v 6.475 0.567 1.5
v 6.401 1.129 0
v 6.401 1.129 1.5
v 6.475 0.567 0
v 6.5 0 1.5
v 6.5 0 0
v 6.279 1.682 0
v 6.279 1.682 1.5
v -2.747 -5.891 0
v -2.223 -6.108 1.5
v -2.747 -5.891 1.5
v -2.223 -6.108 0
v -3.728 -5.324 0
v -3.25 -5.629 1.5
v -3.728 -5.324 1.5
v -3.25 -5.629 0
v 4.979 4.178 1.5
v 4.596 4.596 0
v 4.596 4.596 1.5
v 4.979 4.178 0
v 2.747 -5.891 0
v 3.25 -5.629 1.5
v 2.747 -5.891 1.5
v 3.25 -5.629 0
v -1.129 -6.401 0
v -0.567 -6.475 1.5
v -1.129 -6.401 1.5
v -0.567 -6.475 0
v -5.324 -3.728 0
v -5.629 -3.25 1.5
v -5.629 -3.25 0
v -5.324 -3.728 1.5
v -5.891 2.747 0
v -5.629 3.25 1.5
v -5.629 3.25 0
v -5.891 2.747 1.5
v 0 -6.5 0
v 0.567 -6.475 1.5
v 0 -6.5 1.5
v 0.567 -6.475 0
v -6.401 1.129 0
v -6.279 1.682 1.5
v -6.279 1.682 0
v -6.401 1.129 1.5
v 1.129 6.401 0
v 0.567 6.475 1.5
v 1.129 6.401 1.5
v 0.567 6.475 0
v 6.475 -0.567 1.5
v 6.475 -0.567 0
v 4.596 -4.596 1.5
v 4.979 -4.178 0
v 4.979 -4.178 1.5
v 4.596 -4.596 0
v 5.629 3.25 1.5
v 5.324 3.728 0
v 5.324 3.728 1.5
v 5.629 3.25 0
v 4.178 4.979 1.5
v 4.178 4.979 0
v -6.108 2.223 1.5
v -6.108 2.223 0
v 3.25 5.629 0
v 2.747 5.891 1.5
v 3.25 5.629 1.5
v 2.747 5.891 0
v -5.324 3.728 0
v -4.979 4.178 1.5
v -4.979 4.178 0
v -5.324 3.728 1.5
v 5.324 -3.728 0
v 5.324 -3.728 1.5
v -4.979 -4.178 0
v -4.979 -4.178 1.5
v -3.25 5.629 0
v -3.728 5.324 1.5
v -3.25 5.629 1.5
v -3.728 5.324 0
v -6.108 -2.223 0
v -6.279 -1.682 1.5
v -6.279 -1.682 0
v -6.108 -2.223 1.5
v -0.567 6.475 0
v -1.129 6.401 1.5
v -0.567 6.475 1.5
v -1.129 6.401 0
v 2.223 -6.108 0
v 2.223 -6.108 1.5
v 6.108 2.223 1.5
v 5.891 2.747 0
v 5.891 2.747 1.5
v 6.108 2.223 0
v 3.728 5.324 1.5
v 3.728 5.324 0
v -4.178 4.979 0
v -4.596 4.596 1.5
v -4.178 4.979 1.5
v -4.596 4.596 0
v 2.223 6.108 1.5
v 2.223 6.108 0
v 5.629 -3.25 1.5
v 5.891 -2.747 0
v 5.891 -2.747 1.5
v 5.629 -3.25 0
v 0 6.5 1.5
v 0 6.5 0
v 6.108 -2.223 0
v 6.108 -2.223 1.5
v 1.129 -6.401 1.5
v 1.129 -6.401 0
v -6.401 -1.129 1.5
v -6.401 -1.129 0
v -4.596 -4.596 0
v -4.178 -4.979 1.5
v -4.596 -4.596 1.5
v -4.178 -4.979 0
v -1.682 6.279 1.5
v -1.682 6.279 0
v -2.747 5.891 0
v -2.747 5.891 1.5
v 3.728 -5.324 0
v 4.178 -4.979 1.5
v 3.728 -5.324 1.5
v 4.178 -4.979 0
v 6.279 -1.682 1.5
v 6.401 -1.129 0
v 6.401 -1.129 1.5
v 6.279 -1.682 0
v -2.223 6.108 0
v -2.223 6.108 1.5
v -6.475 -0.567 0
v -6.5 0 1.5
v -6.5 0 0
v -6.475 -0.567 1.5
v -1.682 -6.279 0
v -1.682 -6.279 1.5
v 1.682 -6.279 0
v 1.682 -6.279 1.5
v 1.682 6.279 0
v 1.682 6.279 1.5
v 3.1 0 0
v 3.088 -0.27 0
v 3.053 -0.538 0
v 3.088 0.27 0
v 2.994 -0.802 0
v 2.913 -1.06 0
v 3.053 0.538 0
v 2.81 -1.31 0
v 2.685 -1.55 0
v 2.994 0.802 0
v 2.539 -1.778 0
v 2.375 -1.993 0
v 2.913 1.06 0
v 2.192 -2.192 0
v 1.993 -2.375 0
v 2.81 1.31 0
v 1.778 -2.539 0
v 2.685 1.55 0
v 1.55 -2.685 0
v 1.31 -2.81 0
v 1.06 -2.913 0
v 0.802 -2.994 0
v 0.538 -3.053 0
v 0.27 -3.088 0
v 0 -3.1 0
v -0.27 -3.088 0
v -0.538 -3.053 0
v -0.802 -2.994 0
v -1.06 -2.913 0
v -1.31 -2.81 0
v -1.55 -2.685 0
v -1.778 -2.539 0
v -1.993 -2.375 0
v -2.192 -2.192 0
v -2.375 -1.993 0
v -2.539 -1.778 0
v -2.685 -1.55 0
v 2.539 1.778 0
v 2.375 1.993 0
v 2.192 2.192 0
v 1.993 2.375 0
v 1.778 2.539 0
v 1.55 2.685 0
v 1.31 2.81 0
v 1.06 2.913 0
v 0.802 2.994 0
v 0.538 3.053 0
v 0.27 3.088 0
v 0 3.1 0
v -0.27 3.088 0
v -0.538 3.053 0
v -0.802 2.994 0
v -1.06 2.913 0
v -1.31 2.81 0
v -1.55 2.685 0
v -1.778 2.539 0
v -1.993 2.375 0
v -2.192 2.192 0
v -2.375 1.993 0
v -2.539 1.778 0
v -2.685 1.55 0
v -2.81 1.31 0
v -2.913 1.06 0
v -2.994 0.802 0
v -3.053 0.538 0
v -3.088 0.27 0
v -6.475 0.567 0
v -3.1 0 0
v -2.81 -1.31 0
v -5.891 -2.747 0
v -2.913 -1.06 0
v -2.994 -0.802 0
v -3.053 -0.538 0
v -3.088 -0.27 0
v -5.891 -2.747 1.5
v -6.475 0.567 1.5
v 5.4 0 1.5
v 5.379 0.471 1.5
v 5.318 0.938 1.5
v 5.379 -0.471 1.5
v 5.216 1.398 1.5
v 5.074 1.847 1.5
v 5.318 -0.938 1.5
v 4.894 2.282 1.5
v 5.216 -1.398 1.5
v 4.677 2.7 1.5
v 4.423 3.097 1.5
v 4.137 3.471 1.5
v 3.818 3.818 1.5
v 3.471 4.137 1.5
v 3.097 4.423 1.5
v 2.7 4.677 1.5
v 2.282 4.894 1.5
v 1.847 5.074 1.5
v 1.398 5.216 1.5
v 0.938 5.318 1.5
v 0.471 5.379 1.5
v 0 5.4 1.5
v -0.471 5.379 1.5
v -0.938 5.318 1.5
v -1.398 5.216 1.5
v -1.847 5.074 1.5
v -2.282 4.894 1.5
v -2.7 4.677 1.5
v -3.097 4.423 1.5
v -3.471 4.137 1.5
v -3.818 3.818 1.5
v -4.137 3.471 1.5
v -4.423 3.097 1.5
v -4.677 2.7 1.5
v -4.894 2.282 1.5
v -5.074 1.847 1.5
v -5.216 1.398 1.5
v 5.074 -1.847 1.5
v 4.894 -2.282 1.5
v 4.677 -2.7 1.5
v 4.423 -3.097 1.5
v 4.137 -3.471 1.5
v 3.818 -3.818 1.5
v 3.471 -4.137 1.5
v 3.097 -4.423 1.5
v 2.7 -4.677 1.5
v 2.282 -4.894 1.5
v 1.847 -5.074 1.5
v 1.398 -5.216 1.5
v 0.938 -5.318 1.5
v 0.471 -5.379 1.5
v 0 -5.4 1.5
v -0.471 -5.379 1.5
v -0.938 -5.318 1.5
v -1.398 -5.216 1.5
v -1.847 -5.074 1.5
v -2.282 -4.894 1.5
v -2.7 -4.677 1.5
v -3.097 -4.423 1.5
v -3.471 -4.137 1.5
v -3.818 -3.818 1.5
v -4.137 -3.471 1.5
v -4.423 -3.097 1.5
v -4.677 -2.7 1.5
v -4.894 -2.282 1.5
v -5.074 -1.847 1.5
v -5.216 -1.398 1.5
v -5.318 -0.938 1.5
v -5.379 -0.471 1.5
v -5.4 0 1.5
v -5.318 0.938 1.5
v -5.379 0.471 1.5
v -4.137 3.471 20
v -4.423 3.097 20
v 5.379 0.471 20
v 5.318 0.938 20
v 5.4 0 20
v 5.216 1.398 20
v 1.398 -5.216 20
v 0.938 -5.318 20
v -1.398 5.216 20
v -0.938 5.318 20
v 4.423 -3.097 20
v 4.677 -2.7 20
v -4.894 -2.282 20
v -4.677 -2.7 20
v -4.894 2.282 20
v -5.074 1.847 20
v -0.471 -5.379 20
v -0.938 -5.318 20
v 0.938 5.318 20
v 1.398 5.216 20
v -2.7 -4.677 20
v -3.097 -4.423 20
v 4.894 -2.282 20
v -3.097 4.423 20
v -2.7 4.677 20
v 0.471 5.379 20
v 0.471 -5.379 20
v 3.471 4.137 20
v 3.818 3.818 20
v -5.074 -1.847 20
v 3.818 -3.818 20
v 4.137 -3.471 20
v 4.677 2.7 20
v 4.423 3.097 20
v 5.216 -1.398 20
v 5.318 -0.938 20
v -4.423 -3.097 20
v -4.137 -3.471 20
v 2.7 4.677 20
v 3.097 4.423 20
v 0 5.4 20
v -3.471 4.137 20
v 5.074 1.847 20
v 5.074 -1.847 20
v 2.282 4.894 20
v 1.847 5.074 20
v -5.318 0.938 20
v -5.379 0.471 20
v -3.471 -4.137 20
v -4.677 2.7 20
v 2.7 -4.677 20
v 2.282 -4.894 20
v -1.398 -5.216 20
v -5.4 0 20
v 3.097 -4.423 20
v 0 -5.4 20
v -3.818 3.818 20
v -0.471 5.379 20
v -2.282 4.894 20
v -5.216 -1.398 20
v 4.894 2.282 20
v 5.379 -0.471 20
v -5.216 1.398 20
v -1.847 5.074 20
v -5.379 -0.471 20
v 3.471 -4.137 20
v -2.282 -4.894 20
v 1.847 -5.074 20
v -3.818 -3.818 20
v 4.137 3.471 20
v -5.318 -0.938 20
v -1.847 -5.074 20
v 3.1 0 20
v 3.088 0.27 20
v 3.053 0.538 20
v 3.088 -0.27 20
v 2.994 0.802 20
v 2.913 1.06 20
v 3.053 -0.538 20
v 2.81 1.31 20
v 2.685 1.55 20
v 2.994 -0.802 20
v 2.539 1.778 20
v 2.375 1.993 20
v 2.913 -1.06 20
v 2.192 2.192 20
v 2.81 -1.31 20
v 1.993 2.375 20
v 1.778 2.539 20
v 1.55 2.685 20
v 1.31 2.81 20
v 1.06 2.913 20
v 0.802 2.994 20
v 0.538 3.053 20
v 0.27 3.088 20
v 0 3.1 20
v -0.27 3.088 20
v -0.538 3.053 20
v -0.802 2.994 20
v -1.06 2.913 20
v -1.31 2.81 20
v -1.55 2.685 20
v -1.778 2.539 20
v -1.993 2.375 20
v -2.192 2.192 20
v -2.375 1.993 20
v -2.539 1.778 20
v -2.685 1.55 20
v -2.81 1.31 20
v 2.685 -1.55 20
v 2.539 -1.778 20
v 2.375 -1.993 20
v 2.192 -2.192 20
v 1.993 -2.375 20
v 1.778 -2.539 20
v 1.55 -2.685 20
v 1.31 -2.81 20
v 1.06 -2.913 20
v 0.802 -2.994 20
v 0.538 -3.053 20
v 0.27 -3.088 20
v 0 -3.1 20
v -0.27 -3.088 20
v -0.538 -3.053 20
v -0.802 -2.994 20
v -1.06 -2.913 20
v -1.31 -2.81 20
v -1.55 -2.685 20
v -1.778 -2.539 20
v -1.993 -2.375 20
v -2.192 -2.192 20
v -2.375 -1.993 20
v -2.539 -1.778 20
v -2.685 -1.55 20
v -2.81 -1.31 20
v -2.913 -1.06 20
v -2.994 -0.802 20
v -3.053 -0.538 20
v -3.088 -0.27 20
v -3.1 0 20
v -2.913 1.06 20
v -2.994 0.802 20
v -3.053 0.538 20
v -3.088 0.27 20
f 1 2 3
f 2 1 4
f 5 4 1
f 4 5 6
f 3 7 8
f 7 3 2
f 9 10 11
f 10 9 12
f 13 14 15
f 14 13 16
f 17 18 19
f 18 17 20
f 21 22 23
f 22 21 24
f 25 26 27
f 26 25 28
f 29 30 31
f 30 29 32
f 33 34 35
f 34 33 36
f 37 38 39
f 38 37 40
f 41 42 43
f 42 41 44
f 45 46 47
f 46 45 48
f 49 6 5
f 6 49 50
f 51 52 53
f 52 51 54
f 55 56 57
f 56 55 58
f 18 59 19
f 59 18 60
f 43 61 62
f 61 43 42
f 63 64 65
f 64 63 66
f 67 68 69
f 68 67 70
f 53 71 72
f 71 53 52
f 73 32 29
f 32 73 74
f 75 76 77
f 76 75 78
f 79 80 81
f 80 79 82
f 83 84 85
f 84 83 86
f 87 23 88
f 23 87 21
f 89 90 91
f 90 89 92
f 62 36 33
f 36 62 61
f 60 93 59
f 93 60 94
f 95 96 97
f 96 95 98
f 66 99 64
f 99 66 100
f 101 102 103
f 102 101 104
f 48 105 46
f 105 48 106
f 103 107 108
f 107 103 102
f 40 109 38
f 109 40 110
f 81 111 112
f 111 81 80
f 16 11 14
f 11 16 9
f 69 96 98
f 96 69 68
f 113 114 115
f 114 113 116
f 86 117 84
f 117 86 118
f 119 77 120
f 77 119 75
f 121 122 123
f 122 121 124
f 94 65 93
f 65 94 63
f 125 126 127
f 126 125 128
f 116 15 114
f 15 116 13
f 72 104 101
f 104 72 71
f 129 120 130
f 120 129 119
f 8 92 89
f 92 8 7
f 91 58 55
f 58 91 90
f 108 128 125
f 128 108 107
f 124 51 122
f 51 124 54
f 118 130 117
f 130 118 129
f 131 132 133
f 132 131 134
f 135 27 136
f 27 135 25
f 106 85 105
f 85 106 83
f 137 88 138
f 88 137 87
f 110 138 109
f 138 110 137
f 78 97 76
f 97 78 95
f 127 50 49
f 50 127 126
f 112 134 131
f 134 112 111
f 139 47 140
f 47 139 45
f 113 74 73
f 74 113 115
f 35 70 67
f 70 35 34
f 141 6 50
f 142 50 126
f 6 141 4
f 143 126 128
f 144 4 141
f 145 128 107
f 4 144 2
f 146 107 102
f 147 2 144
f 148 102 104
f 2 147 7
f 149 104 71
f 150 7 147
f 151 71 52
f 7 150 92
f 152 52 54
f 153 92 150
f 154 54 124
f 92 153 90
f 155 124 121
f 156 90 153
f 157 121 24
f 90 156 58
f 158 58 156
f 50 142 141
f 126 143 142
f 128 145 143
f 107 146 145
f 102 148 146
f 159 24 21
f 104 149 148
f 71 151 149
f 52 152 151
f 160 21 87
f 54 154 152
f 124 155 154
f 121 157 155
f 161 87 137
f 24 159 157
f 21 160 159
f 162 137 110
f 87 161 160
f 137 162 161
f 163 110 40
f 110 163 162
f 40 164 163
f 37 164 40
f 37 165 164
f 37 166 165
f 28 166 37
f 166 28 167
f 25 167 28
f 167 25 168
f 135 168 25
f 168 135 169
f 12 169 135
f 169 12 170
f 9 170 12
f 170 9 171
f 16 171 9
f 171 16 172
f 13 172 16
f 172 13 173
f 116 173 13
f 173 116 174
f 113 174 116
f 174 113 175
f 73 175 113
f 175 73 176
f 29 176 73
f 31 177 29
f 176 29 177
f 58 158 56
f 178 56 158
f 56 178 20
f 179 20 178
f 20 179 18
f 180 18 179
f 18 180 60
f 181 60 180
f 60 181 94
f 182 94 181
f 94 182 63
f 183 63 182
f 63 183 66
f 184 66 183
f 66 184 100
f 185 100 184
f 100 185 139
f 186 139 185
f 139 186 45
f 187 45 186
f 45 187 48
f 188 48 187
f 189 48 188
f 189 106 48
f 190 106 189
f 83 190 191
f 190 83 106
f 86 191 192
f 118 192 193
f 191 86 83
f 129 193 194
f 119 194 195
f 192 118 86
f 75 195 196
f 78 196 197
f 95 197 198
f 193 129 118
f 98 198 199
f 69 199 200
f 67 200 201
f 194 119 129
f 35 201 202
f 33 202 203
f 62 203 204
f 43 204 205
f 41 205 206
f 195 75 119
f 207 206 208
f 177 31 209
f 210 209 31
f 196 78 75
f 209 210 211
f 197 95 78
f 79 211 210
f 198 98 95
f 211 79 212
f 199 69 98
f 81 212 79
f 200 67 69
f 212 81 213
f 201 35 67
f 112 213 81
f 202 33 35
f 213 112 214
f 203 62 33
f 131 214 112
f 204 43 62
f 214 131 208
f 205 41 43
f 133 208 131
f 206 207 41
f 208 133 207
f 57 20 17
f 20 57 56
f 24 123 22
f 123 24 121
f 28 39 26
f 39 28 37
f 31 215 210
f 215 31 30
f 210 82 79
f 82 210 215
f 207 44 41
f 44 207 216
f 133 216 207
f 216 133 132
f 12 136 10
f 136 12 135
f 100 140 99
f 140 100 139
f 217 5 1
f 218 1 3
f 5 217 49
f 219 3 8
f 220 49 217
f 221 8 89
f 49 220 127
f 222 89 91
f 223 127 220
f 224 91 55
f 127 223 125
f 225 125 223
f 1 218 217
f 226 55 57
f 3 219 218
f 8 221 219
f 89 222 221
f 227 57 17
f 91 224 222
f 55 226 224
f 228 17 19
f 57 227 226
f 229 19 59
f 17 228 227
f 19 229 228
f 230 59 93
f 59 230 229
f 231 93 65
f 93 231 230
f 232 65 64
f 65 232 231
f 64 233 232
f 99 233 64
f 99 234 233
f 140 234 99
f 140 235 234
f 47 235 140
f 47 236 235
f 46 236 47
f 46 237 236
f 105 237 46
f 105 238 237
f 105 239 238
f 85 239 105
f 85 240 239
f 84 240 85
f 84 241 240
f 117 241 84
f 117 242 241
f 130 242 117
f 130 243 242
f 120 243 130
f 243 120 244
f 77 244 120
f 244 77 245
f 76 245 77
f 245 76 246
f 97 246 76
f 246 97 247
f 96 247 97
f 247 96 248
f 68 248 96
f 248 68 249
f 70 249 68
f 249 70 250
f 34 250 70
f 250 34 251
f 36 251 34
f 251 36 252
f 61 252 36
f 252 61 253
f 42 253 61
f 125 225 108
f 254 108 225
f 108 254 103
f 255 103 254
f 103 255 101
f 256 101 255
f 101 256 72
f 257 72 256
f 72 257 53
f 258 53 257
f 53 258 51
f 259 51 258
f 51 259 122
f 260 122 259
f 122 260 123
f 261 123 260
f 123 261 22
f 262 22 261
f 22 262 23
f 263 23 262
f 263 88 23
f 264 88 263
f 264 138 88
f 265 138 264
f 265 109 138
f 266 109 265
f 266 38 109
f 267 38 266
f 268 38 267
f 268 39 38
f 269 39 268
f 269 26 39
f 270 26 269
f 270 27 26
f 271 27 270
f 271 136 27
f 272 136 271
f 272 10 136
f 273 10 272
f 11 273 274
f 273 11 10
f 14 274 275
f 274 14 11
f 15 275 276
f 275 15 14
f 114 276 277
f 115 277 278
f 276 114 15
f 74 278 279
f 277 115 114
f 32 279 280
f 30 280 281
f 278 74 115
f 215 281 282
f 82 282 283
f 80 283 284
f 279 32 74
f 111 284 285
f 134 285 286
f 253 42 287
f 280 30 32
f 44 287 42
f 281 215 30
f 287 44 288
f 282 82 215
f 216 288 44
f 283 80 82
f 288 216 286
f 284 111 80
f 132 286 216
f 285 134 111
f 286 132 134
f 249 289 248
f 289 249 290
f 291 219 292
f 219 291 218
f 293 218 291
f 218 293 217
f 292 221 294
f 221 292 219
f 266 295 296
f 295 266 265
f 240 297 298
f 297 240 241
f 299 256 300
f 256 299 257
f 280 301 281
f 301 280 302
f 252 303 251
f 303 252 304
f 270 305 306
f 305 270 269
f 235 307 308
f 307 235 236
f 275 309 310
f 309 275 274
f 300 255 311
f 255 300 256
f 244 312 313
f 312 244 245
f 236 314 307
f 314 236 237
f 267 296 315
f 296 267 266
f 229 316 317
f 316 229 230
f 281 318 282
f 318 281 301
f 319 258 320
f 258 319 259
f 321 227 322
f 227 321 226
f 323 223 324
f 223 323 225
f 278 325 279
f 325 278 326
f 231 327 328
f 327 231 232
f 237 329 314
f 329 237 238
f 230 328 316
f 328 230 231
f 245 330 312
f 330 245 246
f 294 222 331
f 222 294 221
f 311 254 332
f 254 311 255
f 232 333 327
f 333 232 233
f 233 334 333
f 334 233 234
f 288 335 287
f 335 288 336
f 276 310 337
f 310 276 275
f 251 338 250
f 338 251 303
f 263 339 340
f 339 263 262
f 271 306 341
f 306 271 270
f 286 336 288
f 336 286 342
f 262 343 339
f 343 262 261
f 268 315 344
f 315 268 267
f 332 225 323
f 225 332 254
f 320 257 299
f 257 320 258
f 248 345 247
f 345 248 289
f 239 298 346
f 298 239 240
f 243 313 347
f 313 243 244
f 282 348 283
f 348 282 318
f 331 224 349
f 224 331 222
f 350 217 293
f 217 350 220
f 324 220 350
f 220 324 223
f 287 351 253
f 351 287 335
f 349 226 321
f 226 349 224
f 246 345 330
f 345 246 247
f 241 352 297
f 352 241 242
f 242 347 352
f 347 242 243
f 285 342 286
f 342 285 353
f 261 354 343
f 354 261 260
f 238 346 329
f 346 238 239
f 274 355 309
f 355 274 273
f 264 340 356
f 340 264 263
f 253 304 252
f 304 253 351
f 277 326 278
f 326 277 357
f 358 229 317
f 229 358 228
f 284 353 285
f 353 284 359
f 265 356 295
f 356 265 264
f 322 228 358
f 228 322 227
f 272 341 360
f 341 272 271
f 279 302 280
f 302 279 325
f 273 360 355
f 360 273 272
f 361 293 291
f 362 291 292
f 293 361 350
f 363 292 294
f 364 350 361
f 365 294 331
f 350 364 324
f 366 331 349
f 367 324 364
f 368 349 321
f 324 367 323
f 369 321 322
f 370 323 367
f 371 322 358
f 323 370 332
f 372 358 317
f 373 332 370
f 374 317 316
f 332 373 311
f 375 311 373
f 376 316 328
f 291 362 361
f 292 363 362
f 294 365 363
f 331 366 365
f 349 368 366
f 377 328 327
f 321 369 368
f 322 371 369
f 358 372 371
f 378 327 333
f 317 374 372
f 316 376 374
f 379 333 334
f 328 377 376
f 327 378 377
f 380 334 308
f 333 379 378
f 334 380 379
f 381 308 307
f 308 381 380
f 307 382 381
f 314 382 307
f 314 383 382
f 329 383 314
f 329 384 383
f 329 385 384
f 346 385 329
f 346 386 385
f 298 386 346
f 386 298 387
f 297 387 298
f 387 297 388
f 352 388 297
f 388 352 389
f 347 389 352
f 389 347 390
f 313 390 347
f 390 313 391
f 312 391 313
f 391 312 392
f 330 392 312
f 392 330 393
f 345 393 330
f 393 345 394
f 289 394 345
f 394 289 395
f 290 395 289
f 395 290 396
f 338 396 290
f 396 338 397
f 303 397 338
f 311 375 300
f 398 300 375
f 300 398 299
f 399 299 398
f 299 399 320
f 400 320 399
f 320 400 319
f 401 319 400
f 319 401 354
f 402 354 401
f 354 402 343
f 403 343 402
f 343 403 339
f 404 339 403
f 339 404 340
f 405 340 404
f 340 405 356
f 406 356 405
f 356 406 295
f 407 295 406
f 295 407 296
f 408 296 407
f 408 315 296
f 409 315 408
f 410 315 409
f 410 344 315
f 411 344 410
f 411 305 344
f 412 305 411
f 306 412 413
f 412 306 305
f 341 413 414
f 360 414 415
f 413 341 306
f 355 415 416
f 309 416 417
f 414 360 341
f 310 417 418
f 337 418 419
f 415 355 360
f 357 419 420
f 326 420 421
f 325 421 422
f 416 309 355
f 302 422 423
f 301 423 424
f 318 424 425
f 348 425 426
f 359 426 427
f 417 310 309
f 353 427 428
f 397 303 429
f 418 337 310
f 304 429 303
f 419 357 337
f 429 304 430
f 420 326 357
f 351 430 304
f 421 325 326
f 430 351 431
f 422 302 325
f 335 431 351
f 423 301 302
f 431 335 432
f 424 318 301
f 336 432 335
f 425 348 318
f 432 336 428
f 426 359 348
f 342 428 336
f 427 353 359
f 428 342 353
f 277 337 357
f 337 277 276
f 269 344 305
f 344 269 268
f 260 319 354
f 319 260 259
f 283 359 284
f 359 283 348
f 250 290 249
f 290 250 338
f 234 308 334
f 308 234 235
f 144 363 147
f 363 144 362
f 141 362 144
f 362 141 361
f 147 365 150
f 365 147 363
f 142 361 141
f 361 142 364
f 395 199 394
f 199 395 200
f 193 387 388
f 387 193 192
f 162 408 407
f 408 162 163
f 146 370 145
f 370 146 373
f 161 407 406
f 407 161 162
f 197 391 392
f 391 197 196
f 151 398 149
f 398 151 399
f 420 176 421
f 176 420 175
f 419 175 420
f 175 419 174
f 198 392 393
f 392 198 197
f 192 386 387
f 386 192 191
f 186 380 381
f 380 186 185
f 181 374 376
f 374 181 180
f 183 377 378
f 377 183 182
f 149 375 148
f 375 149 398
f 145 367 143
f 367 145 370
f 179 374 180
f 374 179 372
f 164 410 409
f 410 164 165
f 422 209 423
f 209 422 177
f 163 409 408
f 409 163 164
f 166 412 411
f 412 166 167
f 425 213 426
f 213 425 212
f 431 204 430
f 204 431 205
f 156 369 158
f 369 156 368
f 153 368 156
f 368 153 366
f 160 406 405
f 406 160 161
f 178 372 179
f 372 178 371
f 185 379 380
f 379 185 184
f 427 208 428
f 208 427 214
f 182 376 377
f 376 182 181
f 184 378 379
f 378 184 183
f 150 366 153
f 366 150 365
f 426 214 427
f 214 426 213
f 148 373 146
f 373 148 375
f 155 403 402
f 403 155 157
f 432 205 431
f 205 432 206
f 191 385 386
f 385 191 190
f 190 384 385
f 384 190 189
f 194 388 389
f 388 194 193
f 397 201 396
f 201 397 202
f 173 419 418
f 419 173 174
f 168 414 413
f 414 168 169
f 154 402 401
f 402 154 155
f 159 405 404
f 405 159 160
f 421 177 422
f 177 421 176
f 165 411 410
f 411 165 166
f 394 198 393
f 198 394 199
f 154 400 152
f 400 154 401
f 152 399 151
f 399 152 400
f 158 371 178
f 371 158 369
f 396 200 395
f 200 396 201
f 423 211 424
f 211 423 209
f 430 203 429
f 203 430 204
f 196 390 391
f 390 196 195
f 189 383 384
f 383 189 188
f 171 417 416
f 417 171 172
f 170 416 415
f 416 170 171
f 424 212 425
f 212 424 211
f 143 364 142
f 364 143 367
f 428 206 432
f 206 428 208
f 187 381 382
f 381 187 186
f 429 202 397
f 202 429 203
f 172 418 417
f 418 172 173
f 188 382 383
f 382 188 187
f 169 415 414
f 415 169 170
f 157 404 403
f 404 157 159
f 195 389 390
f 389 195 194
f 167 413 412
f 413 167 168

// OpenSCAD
// Adapter sleeve - a collar with a sleeve body that lines a 1.5 mL rack hole to hold a 0.2 mL
// PCR tube, with a through bore. NOVEL general part (a generic tube adapter).
//

top_d     = 13;
body_d    = 10.8;
collar_t  = 1.5;
body_h    = 21.5 - 1.5;
bore_d    = 6.2;

$fn = 72;

difference() {
    union() {
        cylinder(h = collar_t, d = top_d);
        cylinder(h = body_h, d = body_d);
    };
    translate([0, 0, -1]) cylinder(h = body_h + collar_t + 2, d = bore_d);
}
